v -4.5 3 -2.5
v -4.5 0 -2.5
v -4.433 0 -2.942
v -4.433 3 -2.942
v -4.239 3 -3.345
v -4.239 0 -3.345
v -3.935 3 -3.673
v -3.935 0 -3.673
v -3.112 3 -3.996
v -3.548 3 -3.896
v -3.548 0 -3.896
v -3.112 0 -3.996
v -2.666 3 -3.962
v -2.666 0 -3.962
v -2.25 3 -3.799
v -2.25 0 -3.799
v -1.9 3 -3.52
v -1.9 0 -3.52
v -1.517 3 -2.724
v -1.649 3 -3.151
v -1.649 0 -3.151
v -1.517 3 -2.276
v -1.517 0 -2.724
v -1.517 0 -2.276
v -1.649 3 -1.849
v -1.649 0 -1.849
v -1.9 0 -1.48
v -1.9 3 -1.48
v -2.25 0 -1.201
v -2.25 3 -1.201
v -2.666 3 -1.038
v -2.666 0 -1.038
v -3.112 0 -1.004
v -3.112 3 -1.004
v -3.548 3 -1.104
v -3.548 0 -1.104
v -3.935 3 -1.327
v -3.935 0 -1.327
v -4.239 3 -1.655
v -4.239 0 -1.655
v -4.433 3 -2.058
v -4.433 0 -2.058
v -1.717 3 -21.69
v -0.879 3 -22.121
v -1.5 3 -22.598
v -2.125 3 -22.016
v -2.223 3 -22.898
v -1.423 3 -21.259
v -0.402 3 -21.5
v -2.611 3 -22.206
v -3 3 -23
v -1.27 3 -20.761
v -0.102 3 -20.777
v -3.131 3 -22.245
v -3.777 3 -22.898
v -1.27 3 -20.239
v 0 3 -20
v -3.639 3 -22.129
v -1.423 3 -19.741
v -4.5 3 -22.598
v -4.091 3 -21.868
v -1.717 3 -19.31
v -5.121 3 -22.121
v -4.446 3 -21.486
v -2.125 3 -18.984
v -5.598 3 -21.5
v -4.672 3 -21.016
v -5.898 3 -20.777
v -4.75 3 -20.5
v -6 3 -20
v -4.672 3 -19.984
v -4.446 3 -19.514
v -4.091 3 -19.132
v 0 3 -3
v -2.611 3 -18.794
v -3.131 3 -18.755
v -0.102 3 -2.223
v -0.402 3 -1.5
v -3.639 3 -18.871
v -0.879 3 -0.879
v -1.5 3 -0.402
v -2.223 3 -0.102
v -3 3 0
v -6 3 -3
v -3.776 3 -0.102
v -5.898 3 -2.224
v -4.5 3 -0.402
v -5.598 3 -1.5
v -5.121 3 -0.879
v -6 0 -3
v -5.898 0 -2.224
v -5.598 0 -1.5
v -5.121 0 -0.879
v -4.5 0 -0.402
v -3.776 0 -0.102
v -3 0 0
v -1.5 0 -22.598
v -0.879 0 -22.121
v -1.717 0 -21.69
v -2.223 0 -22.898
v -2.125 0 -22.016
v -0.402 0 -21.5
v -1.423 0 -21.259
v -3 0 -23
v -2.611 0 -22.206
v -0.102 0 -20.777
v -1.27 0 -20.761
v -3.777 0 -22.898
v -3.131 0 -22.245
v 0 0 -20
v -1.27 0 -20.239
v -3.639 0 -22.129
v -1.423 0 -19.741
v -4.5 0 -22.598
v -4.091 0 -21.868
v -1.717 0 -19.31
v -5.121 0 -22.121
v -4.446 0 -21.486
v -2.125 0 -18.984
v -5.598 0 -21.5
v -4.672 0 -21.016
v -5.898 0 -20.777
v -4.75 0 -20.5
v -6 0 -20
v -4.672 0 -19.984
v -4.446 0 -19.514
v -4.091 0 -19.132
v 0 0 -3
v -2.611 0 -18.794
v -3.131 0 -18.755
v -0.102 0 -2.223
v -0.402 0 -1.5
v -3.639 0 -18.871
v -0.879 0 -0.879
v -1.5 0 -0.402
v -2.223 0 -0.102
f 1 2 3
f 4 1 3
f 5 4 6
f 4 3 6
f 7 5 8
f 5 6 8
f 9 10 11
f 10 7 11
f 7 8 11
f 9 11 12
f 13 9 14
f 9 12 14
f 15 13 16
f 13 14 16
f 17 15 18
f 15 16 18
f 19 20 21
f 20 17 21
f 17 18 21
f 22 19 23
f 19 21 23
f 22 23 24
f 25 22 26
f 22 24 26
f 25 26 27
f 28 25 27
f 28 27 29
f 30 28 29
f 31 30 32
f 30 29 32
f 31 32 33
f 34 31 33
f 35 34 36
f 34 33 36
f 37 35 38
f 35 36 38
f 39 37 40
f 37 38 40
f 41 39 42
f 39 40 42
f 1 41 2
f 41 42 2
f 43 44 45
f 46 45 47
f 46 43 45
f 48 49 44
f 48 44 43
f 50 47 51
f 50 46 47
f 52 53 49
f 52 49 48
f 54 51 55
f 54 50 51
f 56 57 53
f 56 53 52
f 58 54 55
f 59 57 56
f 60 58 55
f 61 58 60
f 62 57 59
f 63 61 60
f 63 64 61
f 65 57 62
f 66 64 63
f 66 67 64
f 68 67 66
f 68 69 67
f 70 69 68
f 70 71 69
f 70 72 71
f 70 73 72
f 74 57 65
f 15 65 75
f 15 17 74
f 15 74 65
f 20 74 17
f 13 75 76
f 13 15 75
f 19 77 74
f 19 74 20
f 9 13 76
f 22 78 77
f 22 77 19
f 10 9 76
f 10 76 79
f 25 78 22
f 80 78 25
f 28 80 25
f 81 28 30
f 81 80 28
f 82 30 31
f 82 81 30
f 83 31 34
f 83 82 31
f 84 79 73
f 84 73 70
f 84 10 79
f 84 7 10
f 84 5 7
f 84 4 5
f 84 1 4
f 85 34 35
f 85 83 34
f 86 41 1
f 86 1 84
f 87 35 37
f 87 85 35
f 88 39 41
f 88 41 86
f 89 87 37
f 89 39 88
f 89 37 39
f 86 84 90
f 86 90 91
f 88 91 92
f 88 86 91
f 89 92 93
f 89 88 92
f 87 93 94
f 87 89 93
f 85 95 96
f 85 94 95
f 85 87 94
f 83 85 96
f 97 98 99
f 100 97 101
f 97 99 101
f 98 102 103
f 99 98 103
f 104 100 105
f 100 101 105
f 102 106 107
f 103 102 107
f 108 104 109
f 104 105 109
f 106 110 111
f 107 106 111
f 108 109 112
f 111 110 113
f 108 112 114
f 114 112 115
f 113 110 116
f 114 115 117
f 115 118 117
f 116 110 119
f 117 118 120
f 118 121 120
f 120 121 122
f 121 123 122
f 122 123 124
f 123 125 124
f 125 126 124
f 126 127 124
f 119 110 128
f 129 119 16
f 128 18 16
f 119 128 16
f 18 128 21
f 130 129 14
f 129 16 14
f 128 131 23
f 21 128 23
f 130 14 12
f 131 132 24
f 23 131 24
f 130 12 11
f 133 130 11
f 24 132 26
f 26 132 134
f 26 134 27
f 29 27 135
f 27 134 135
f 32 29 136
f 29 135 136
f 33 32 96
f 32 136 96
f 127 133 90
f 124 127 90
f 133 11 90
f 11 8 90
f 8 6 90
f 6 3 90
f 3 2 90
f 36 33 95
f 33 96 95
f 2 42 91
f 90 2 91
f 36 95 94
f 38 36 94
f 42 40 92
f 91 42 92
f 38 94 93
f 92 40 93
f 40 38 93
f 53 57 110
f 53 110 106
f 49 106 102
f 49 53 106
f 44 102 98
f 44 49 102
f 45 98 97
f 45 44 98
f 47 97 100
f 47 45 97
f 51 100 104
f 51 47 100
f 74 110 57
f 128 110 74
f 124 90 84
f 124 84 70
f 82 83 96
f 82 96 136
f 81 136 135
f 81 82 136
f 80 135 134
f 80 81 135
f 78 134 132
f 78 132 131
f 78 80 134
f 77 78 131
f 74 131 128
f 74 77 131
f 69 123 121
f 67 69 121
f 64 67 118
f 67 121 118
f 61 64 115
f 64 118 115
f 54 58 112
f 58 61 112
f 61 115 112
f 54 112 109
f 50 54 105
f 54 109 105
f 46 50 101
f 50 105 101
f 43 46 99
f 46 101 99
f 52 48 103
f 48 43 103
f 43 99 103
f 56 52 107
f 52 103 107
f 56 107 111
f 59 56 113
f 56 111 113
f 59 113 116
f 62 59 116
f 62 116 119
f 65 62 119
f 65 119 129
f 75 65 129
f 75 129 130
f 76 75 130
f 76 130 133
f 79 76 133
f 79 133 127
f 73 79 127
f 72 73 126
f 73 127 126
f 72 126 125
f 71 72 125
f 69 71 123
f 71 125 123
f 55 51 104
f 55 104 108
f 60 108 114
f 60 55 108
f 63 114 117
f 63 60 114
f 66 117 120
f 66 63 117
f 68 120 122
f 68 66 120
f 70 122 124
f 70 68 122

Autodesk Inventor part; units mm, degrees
ref_plane "YZ Plane" through (0, 0, 0) normal (1, 0, 0) x (0, 1, 0)
ref_plane "XZ Plane" through (0, 0, 0) normal (0, 1, 0) x (-1, 0, 0)
ref_plane "XY Plane" through (0, 0, 0) normal (0, 0, 1) x (1, 0, 0)
sketch "Sketch1" plane through (0, 0, 0) normal (0, 1, 0) x (-1, 0, 0)
  line L0 (0, 0) -> (6, 0)
  line L1 (6, 0) -> (6, -23)
  line L2 (6, -23) -> (0, -23)
  line L3 (0, -23) -> (0, 0)
  circle A0 centre (3, -2.5) radius 1.5
  circle A1 centre (3, -20.5) radius 1.75
  dimension "d0" = 6
  dimension "d1" = 23
  dimension "d2" = 6
  dimension "d4" = 3
  dimension "d5" = 3.5
  dimension "d6" = 2.5
  dimension "d7" = 2.5
extrude "Extrusion1" add sketch "Sketch1" along normal blind 3
fillet "Fillet1" radius 3 1 edges at (-6, 1.5, 0)
fillet "Fillet2" radius 3 3 edges at (0, 1.5, 0) (-6, 1.5, -23) (0, 1.5, -23)
properties part number "reverse gear drag link"
